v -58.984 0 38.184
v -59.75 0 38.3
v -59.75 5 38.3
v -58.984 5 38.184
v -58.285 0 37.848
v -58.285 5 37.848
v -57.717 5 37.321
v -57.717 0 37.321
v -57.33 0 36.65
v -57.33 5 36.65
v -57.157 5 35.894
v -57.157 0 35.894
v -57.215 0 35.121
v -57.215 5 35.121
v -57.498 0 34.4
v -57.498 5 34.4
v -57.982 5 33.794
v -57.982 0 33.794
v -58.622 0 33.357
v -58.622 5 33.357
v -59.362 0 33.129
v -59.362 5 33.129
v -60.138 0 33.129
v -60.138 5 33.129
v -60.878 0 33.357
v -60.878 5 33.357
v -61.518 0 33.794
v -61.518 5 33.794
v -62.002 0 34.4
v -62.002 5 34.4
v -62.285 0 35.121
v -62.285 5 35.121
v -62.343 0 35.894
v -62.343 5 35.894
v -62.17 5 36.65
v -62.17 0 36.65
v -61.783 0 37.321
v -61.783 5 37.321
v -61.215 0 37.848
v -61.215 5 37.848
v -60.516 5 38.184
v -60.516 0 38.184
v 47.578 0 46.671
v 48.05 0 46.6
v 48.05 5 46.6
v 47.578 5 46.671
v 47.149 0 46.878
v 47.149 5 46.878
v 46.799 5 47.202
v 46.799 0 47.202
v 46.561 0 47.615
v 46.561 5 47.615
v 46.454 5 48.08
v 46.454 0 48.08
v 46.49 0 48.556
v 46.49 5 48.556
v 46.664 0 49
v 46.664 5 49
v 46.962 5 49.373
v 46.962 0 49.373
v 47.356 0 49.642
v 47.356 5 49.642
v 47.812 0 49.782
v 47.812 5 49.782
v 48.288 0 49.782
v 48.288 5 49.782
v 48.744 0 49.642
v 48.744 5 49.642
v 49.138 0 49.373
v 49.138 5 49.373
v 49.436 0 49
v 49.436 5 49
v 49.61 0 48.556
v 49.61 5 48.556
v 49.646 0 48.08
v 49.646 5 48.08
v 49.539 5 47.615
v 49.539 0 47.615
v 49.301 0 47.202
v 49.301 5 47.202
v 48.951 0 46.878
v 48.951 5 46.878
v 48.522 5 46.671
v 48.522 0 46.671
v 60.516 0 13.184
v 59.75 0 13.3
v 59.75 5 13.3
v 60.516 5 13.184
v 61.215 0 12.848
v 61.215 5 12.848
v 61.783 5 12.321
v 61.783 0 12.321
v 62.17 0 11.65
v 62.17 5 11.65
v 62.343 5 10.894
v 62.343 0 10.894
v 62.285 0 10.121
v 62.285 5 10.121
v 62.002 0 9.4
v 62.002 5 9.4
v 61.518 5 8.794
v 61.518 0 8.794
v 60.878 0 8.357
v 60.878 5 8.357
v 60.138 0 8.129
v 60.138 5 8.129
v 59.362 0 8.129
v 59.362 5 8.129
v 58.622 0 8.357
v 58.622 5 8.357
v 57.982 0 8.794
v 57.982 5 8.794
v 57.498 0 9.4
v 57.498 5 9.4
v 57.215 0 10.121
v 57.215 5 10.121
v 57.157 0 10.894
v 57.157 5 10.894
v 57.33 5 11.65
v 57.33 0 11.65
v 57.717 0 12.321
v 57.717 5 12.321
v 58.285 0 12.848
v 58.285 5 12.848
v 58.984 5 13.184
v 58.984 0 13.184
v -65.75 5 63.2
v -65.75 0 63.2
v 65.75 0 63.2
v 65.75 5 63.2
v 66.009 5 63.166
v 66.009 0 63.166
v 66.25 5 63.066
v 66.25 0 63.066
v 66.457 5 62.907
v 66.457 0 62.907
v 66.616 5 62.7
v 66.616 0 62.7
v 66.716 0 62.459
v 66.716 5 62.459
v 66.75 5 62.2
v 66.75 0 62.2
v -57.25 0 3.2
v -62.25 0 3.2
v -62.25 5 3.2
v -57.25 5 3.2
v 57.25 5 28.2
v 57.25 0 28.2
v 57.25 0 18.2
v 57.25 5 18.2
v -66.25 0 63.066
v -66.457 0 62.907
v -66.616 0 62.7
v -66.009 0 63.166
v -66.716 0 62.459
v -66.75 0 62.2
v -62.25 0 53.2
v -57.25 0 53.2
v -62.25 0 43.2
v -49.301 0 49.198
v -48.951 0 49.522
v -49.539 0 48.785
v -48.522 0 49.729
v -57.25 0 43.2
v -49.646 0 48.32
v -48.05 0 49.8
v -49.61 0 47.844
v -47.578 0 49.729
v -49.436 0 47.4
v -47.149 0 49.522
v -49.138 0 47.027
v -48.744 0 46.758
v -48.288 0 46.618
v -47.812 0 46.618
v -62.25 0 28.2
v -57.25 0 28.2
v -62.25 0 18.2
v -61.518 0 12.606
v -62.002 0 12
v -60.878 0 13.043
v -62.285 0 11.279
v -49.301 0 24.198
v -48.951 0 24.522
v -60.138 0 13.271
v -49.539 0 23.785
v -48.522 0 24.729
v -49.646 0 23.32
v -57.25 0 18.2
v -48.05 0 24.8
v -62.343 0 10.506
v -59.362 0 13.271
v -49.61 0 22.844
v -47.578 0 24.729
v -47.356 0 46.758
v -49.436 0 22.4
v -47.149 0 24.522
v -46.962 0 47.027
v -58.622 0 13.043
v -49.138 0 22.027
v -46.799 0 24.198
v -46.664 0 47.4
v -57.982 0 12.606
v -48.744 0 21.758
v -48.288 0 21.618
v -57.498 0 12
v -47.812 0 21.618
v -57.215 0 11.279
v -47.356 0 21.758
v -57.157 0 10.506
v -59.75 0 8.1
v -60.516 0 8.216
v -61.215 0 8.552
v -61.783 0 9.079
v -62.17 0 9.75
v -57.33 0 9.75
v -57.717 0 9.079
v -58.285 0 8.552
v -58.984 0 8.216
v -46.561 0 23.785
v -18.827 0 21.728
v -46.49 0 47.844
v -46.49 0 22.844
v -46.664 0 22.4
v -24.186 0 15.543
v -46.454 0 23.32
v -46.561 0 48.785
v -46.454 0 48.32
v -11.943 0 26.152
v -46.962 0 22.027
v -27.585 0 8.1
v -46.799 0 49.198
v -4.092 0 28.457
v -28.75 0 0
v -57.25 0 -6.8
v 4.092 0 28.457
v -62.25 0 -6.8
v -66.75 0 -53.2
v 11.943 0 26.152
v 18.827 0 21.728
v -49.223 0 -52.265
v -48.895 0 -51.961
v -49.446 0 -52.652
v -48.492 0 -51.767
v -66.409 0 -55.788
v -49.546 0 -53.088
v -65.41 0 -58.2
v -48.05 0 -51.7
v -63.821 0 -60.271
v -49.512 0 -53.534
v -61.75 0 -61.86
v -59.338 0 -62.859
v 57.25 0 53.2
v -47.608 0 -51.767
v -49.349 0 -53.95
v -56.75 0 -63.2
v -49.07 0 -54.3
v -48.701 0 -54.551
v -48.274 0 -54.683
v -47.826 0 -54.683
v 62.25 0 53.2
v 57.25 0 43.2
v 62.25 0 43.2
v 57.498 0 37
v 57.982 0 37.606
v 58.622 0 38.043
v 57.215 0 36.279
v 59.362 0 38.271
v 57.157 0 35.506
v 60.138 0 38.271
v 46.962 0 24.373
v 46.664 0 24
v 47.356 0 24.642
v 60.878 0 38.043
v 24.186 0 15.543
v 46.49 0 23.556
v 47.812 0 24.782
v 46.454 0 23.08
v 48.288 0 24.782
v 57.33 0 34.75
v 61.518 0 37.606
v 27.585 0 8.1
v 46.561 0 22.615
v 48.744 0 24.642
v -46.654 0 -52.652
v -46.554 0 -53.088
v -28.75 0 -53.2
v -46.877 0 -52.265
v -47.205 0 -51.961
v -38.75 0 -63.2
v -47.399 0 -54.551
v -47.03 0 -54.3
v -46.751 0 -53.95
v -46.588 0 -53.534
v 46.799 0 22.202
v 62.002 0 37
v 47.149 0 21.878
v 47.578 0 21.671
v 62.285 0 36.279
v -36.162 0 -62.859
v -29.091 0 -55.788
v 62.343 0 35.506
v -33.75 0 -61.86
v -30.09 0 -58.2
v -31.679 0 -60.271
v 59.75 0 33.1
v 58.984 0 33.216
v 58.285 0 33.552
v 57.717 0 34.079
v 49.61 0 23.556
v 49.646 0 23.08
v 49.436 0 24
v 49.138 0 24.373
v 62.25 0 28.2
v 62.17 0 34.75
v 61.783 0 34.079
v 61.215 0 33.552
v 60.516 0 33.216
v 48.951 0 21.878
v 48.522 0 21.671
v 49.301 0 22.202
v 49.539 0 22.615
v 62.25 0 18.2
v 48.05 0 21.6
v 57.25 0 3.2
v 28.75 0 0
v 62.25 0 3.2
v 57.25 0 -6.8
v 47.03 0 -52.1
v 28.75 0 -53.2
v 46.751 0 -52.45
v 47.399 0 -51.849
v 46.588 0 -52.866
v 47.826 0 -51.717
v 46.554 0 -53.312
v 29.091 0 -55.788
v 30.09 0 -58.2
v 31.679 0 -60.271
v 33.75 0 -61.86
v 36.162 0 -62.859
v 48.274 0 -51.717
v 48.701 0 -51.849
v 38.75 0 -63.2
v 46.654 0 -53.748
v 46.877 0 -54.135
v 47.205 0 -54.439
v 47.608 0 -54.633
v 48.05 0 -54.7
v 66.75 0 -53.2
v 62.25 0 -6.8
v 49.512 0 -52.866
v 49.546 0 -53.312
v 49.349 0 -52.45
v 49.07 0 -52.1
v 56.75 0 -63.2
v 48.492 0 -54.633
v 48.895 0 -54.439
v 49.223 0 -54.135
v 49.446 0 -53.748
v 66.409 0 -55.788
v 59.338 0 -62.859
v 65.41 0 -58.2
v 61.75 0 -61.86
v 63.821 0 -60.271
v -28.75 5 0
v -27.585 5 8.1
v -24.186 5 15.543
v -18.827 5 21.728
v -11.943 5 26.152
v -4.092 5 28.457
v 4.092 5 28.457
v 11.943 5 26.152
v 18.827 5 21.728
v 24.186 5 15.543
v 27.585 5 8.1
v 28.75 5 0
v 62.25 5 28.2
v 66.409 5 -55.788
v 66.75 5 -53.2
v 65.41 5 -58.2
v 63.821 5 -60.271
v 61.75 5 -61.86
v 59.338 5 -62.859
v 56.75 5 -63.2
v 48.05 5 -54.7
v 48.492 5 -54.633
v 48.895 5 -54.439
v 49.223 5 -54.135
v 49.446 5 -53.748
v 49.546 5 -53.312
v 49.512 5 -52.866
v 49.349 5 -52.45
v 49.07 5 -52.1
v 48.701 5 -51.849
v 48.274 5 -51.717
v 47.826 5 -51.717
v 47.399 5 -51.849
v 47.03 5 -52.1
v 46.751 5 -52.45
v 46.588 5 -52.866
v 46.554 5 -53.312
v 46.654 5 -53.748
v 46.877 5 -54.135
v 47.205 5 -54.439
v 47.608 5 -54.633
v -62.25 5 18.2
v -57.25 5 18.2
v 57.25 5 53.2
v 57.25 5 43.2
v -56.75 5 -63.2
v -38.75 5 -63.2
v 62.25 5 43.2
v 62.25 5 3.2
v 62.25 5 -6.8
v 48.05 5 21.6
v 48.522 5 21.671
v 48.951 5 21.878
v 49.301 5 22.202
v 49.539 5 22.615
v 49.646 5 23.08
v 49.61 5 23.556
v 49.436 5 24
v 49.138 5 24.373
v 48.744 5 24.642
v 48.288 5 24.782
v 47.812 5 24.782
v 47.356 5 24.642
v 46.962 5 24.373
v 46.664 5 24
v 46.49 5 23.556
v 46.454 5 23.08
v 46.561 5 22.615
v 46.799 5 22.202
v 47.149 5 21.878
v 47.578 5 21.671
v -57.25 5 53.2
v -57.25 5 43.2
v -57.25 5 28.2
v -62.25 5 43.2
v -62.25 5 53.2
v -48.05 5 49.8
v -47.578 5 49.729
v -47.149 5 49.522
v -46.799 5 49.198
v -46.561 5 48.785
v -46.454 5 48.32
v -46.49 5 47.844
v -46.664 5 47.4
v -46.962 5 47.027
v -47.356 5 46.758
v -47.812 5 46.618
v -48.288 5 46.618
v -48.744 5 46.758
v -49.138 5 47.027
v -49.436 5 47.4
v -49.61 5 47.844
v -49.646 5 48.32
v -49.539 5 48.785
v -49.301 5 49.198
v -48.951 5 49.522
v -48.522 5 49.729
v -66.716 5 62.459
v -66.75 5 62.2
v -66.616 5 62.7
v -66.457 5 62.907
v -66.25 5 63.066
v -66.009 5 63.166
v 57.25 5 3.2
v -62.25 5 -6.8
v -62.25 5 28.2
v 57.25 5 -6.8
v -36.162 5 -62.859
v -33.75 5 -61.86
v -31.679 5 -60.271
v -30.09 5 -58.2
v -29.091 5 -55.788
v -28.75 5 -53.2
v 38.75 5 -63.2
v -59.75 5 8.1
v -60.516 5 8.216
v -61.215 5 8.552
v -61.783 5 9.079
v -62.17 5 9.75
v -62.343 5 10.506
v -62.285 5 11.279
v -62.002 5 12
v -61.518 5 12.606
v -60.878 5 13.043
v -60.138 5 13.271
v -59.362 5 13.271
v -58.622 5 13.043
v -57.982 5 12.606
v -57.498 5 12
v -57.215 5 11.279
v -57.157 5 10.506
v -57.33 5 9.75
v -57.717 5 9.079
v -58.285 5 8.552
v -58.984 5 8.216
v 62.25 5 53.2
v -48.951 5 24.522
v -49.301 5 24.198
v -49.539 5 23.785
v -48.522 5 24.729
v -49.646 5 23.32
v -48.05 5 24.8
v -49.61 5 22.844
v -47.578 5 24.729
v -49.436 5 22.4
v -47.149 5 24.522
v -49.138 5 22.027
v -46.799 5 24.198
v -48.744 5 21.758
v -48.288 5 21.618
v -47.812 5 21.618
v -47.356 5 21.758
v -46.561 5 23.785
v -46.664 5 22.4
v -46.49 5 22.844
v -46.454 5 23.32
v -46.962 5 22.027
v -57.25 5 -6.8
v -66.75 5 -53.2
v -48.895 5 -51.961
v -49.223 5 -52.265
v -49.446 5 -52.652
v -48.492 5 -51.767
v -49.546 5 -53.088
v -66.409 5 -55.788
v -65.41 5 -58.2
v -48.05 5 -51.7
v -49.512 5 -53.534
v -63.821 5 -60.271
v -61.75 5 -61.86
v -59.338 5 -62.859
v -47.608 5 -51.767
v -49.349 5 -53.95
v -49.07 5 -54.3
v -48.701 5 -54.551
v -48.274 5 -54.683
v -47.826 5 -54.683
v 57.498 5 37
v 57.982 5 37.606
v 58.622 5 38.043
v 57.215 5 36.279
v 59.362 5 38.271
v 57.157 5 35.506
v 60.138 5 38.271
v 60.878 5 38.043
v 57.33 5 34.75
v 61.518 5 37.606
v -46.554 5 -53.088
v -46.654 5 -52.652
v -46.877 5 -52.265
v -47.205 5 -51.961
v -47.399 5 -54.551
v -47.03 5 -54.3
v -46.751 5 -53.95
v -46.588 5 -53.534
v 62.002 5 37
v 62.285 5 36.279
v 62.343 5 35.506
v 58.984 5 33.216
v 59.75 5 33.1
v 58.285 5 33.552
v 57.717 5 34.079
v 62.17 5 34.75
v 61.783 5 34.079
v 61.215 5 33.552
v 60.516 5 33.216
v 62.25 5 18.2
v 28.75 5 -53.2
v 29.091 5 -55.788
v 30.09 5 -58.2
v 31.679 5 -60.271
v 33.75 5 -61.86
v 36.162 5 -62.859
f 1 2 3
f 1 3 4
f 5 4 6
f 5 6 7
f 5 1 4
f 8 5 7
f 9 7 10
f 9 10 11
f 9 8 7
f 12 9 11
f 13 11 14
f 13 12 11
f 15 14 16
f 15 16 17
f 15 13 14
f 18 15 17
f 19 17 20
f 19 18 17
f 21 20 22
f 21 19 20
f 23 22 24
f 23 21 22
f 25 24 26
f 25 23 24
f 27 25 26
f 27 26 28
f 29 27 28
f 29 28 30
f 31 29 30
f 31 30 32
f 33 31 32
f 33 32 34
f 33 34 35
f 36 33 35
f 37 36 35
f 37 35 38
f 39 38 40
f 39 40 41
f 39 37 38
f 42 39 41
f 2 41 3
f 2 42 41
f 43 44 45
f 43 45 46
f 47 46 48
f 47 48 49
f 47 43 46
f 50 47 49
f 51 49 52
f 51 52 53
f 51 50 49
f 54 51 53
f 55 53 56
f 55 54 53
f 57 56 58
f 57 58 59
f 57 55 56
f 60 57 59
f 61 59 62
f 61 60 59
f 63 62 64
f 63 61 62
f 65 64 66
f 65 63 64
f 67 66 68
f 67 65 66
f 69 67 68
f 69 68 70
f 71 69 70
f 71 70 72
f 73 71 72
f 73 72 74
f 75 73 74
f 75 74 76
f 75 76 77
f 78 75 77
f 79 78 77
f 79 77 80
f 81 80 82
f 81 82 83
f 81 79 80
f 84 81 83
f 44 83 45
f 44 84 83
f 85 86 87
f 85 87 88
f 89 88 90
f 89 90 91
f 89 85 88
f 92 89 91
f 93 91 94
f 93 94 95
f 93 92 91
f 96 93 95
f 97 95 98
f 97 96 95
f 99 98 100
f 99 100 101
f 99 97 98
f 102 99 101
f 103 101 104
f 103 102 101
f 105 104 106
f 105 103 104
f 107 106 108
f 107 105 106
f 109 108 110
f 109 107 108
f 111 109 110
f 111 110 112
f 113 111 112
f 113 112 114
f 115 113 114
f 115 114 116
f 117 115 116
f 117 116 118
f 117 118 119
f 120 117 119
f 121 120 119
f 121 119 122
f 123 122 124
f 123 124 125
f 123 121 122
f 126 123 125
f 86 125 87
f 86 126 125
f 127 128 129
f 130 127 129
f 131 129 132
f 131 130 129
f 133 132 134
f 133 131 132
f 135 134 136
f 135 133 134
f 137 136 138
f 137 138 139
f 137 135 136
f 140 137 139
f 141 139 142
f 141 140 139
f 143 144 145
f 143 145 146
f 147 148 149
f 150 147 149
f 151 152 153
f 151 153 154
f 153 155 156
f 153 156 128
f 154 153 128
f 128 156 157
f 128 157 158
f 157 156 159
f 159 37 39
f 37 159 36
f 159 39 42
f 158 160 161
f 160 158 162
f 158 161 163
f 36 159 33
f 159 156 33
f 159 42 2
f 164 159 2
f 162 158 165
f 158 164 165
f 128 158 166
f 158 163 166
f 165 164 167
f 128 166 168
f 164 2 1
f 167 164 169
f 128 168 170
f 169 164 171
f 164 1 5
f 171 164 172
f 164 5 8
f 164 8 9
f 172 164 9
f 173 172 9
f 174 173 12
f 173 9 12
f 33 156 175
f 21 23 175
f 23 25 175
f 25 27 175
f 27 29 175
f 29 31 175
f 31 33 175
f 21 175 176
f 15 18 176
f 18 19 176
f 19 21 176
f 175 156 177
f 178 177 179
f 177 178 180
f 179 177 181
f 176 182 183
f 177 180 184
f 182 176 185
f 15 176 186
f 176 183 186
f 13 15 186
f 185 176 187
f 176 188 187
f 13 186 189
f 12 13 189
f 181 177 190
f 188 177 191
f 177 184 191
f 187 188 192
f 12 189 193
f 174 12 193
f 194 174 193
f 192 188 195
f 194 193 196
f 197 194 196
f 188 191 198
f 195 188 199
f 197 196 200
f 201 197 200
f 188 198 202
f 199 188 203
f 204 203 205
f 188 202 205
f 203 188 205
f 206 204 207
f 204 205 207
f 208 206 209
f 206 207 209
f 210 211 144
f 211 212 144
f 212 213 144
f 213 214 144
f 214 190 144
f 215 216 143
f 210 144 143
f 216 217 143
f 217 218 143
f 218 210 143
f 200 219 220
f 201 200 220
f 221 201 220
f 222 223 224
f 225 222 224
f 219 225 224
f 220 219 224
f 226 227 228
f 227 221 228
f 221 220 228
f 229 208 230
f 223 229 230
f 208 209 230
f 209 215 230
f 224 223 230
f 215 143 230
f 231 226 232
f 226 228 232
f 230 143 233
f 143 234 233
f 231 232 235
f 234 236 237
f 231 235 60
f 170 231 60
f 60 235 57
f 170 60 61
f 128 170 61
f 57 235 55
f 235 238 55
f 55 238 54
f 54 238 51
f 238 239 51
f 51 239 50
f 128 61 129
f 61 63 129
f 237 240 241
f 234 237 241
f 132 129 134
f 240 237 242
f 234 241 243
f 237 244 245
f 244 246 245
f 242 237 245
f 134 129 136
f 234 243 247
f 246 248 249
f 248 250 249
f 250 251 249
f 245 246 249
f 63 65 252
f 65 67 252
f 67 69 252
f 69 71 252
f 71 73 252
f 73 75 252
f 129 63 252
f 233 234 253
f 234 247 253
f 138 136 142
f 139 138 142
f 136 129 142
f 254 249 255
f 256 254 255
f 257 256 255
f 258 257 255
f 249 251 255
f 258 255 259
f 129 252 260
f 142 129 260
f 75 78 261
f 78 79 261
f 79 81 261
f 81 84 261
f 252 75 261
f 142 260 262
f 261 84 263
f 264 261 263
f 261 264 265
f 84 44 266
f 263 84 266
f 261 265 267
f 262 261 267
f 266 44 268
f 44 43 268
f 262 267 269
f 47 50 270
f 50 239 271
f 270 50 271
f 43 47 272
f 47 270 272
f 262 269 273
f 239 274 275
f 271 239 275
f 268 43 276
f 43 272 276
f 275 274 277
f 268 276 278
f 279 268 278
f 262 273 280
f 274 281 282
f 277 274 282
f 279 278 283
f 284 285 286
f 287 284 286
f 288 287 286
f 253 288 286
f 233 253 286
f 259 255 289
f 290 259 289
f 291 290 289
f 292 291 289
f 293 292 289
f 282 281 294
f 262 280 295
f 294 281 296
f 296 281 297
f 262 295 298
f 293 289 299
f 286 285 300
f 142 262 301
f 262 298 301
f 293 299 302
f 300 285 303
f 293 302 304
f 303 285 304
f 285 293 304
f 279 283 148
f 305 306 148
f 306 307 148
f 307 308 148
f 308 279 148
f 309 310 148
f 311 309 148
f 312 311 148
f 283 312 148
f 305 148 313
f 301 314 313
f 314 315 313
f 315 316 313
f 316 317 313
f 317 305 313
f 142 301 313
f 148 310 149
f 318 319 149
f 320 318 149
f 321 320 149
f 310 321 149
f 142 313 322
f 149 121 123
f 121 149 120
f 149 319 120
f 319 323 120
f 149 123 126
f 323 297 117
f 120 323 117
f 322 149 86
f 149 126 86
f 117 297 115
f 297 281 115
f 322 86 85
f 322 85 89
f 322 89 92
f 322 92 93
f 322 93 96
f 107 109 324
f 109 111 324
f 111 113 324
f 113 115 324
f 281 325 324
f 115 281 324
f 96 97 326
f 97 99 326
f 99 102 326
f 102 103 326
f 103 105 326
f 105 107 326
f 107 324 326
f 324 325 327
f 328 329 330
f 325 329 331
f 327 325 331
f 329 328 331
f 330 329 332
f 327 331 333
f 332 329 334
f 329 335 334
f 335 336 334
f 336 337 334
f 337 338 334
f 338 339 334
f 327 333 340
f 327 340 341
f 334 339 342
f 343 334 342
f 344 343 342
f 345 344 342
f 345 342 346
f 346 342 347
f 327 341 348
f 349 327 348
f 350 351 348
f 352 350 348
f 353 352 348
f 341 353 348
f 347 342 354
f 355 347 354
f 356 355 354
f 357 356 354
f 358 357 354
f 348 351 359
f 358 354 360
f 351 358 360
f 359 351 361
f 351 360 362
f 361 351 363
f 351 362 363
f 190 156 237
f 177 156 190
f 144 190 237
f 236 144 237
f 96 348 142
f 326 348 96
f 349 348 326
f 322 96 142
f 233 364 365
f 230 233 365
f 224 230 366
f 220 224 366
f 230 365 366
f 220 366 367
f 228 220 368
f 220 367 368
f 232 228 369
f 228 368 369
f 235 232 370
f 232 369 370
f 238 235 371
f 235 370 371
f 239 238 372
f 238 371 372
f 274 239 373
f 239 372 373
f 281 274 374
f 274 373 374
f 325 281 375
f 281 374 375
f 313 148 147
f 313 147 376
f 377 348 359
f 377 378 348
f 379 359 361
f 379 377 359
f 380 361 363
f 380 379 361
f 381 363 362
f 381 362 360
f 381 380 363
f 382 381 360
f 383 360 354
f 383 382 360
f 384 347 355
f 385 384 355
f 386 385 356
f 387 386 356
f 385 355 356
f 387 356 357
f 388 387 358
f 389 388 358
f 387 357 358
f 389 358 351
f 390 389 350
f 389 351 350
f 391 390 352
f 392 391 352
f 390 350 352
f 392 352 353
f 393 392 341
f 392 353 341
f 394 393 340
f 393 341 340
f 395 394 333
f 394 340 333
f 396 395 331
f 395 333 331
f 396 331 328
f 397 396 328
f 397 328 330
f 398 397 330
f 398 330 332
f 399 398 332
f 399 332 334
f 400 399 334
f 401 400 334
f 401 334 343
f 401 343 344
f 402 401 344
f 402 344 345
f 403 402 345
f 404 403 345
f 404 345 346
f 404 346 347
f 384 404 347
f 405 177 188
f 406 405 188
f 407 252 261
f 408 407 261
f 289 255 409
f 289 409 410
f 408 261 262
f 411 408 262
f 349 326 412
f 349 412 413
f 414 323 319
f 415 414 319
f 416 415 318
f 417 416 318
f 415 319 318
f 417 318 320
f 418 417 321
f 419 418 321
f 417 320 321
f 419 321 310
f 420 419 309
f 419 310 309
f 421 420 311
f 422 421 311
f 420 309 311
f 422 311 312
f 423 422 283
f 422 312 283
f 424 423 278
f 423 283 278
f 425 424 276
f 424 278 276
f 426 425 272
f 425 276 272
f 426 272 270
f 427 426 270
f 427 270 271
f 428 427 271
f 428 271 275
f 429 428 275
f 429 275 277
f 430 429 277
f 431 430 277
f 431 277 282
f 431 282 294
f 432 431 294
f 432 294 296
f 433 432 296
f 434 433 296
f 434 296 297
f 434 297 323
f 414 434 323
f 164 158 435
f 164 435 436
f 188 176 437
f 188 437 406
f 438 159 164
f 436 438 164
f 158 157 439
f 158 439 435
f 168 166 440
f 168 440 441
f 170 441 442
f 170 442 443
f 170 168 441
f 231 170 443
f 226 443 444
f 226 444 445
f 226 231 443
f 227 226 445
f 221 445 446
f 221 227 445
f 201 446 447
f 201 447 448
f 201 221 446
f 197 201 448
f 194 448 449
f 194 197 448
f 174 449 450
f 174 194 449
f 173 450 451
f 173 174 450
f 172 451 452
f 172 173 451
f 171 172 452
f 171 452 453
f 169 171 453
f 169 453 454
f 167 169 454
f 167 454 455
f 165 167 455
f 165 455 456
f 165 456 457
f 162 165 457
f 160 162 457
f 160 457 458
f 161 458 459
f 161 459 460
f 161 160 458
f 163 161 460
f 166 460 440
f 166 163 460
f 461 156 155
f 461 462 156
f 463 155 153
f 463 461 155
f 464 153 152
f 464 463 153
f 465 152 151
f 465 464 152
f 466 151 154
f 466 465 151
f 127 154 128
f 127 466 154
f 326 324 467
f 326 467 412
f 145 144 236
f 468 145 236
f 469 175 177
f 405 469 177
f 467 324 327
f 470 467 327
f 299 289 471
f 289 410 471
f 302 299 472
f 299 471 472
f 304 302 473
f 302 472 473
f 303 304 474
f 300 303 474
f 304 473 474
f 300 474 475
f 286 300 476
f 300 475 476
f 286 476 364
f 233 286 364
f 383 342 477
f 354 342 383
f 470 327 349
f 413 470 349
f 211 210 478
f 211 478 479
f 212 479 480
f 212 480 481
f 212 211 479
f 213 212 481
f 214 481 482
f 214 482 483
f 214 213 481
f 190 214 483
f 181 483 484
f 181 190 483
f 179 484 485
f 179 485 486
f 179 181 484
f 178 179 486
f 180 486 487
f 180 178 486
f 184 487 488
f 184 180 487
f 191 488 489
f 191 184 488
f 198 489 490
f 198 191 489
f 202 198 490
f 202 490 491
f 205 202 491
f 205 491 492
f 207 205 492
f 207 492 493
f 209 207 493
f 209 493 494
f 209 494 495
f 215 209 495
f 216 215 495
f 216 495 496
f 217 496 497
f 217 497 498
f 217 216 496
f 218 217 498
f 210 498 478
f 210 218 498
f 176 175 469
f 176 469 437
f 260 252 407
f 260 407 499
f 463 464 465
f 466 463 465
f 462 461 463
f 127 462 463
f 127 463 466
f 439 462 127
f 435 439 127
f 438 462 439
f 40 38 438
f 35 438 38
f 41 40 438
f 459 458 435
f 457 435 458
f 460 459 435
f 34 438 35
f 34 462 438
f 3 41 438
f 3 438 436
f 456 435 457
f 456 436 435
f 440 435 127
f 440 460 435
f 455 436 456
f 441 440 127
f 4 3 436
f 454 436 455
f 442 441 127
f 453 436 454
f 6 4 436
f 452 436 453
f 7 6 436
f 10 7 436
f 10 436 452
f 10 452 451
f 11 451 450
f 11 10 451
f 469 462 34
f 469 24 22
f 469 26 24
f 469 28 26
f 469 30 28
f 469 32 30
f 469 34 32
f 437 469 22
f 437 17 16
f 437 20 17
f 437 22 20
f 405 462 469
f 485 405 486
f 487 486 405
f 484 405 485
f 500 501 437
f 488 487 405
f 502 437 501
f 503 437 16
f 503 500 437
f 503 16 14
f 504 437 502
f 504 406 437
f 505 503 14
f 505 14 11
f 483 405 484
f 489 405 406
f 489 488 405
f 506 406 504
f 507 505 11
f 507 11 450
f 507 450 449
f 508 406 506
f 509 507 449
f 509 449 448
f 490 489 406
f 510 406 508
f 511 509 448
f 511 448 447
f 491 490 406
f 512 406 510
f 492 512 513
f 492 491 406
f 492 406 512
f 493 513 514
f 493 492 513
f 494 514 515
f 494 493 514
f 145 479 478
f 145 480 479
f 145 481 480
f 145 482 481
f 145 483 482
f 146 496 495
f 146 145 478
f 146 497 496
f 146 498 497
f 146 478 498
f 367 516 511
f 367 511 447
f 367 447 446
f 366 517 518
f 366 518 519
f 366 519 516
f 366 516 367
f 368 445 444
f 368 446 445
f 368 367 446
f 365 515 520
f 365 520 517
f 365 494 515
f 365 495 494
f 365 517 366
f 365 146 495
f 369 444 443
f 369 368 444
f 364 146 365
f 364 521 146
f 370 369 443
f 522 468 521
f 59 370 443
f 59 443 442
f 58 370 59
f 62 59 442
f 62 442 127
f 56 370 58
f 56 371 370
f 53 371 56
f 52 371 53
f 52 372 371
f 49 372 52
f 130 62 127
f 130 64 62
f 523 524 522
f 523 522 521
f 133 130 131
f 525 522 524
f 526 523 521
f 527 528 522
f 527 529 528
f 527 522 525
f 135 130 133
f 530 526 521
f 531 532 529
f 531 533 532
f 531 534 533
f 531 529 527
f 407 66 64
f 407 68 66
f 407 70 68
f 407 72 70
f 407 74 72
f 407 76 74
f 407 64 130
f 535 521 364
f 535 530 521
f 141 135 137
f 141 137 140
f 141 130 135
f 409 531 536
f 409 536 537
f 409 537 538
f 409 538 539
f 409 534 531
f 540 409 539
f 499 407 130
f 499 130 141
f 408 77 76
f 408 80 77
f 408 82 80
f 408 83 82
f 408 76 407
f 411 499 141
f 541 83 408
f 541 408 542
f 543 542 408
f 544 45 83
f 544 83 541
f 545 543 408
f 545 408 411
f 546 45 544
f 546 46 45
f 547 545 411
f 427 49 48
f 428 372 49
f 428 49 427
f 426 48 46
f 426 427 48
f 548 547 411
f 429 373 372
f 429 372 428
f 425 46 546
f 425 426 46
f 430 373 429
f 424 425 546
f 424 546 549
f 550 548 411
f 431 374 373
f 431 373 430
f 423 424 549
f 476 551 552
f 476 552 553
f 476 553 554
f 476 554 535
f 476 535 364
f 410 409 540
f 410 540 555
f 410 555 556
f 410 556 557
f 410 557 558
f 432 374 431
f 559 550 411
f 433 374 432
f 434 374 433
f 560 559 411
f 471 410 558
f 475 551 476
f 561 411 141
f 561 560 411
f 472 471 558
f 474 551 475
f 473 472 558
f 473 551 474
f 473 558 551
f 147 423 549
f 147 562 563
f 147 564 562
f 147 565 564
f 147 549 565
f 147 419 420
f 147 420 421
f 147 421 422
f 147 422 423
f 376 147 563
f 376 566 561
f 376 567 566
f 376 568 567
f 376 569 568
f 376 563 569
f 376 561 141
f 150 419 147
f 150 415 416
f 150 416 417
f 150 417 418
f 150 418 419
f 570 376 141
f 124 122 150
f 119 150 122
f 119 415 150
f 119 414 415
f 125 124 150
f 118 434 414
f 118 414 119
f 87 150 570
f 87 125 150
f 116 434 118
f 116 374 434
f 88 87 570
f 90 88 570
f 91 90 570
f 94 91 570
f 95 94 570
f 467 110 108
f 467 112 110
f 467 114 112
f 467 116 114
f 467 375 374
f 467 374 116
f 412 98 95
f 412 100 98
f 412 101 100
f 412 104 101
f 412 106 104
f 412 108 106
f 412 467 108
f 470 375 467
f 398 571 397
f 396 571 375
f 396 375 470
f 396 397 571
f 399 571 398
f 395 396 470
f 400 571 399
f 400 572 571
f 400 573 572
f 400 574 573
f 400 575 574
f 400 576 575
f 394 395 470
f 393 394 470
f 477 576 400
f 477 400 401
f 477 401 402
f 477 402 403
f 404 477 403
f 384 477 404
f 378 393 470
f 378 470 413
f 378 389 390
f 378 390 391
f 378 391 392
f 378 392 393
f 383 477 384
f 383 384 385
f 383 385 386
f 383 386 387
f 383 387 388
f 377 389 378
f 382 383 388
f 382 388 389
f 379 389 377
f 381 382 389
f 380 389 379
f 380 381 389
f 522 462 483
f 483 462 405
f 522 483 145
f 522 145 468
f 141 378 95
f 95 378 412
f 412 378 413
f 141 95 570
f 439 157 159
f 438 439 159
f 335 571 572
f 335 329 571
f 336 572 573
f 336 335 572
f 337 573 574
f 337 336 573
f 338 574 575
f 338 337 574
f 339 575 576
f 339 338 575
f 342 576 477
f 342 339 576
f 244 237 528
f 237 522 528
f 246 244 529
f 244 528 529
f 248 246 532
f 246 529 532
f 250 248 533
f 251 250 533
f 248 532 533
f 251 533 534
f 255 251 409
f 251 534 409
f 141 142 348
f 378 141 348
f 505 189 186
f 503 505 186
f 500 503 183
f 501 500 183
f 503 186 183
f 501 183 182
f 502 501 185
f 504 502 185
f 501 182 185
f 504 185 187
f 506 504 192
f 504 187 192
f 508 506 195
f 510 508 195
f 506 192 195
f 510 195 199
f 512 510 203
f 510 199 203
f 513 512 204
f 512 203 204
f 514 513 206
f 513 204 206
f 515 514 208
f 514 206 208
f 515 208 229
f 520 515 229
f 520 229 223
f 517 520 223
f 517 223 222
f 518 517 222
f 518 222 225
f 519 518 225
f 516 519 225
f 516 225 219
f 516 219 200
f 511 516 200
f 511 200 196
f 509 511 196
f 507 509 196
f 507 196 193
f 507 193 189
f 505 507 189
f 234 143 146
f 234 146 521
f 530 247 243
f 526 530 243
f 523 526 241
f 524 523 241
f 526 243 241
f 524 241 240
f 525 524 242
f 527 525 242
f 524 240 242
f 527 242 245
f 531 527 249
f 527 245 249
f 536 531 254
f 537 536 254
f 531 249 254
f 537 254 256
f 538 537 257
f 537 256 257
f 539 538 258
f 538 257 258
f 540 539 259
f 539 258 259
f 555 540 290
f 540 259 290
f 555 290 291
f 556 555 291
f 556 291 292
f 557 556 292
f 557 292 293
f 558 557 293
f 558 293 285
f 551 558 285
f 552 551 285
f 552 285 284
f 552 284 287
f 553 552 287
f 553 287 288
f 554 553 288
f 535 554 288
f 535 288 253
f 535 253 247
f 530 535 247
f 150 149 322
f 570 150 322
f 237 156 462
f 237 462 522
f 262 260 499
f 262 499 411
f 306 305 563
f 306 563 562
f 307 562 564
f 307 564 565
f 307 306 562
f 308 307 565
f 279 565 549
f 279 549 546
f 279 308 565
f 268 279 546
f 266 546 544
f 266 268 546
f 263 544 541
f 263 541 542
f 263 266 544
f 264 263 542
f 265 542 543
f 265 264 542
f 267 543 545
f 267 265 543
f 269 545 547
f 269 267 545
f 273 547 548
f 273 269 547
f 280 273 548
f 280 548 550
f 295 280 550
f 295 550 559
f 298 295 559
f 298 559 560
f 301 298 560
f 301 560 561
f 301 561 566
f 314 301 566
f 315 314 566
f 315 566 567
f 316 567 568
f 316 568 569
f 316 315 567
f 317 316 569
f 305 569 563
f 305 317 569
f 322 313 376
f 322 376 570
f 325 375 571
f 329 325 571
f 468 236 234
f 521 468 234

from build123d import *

# Parameters (mm, degrees)
SKETCH1_W           = 133.5
SKETCH1_H           = 126.4
SKETCH1_R           = 2.6
SKETCH1_R_2         = 1.6
SKETCH1_W_2         = 5
SKETCH1_H_2         = 10
BOSS_EXTRUDE1_DEPTH = 5
CUT_EXTRUDE2_DEPTH  = 10
FILLET2_R           = 10
CUT_EXTRUDE3_REACH  = 94.059
SKETCH5_R           = 1.6
SKETCH5_R_2         = 1.5
FILLET3_R           = 1


with BuildPart() as part:
    # Sketch1 → Boss-Extrude1 (new body)
    with BuildSketch(Plane(origin=(0, 0, 0), x_dir=(1, 0, 0), z_dir=(0, 1, 0))):
        Rectangle(SKETCH1_W, SKETCH1_H)
        with Locations(Location((-59.75, -35.7, 0), (0, 0, 270))):
            Circle(SKETCH1_R, mode=Mode.SUBTRACT)
        with Locations(Location((59.75, -35.7, 0), (0, 0, 90))):
            Circle(SKETCH1_R, mode=Mode.SUBTRACT)
        with Locations(Location((-48.05, -48.2, 0), (0, 0, 270))):
            Circle(SKETCH1_R_2, mode=Mode.SUBTRACT)
        with Locations(Location((48.05, -48.2, 0), (0, 0, 90))):
            Circle(SKETCH1_R_2, mode=Mode.SUBTRACT)
        with Locations(Location((-59.75, -10.7, 0), (0, 0, 90))):
            Circle(SKETCH1_R, mode=Mode.SUBTRACT)
        with Locations(Location((59.75, -10.7, 0), (0, 0, 270))):
            Circle(SKETCH1_R, mode=Mode.SUBTRACT)
        with Locations((-59.75, -48.2)):
            Rectangle(SKETCH1_W_2, SKETCH1_H_2, mode=Mode.SUBTRACT)
        with Locations((-59.75, -23.2)):
            Rectangle(SKETCH1_W_2, SKETCH1_H_2, mode=Mode.SUBTRACT)
        with Locations((59.75, -23.2)):
            Rectangle(SKETCH1_W_2, SKETCH1_H_2, mode=Mode.SUBTRACT)
        with Locations((59.75, -48.2)):
            Rectangle(SKETCH1_W_2, SKETCH1_H_2, mode=Mode.SUBTRACT)
        with Locations((-59.75, 1.8)):
            Rectangle(SKETCH1_W_2, SKETCH1_H_2, mode=Mode.SUBTRACT)
        with Locations((59.75, 1.8)):
            Rectangle(SKETCH1_W_2, SKETCH1_H_2, mode=Mode.SUBTRACT)
    extrude(amount=BOSS_EXTRUDE1_DEPTH)

    # Sketch2 → Cut-Extrude2 (cut)
    with BuildSketch(Plane(origin=(0, 5, 0), x_dir=(1, 0, 0), z_dir=(0, 1, 0))):
        with BuildLine():
            Line((-28.75, 86.678700037), (-28.75, 0))
            ThreePointArc((-28.75, 0), (0, -28.75), (28.75, 0))
            Line((28.75, 0), (28.75, 86.678700037))
            Line((28.75, 86.678700037), (-28.75, 86.678700037))
        make_face()
    extrude(amount=-CUT_EXTRUDE2_DEPTH, mode=Mode.SUBTRACT)

    # Fillet2
    fillet2_edges = [part.edges().sort_by_distance(p)[0] for p in [
        (-28.75, 2.5, -63.2),
        (28.75, 2.5, -63.2),
        (-66.75, 2.5, -63.2),
        (66.75, 2.5, -63.2),
    ]]
    fillet(fillet2_edges, radius=FILLET2_R)

    # Sketch5 → Cut-Extrude3 (cut, up to next)
    with BuildSketch(Plane.XZ, mode=Mode.PRIVATE) as cut_extrude3_sk1:
        with Locations(Location((48.05, 23.2, 0), (0, 0, 270))):
            Circle(SKETCH5_R)
    cut_extrude3_tool1 = extrude(cut_extrude3_sk1.sketch, amount=-CUT_EXTRUDE3_REACH, mode=Mode.PRIVATE) & part.part
    # Sketch5 → Cut-Extrude3 (cut, up to next)
    with BuildSketch(Plane.XZ, mode=Mode.PRIVATE) as cut_extrude3_sk2:
        with Locations(Location((48.05, -53.2, 0), (0, 0, 270))):
            Circle(SKETCH5_R_2)
    cut_extrude3_tool2 = extrude(cut_extrude3_sk2.sketch, amount=-CUT_EXTRUDE3_REACH, mode=Mode.PRIVATE) & part.part
    # Sketch5 → Cut-Extrude3 (cut, up to next)
    with BuildSketch(Plane.XZ, mode=Mode.PRIVATE) as cut_extrude3_sk3:
        with Locations(Location((-48.05, -53.2, 0), (0, 0, 90))):
            Circle(SKETCH5_R_2)
    cut_extrude3_tool3 = extrude(cut_extrude3_sk3.sketch, amount=-CUT_EXTRUDE3_REACH, mode=Mode.PRIVATE) & part.part
    # Sketch5 → Cut-Extrude3 (cut, up to next)
    with BuildSketch(Plane.XZ, mode=Mode.PRIVATE) as cut_extrude3_sk4:
        with Locations(Location((-48.05, 23.2, 0), (0, 0, 90))):
            Circle(SKETCH5_R)
    cut_extrude3_tool4 = extrude(cut_extrude3_sk4.sketch, amount=-CUT_EXTRUDE3_REACH, mode=Mode.PRIVATE) & part.part
    add(cut_extrude3_tool1.solids().sort_by_distance((48.05, 0, 23.2))[0], mode=Mode.SUBTRACT)
    add(cut_extrude3_tool2.solids().sort_by_distance((48.05, 0, -53.2))[0], mode=Mode.SUBTRACT)
    add(cut_extrude3_tool3.solids().sort_by_distance((-48.05, 0, -53.2))[0], mode=Mode.SUBTRACT)
    add(cut_extrude3_tool4.solids().sort_by_distance((-48.05, 0, 23.2))[0], mode=Mode.SUBTRACT)

    # Fillet3
    fillet3_edges = [part.edges().sort_by_distance(p)[0] for p in [
        (66.75, 2.5, 63.2),
        (-66.75, 2.5, 63.2),
    ]]
    fillet(fillet3_edges, radius=FILLET3_R)


solid = part.part
